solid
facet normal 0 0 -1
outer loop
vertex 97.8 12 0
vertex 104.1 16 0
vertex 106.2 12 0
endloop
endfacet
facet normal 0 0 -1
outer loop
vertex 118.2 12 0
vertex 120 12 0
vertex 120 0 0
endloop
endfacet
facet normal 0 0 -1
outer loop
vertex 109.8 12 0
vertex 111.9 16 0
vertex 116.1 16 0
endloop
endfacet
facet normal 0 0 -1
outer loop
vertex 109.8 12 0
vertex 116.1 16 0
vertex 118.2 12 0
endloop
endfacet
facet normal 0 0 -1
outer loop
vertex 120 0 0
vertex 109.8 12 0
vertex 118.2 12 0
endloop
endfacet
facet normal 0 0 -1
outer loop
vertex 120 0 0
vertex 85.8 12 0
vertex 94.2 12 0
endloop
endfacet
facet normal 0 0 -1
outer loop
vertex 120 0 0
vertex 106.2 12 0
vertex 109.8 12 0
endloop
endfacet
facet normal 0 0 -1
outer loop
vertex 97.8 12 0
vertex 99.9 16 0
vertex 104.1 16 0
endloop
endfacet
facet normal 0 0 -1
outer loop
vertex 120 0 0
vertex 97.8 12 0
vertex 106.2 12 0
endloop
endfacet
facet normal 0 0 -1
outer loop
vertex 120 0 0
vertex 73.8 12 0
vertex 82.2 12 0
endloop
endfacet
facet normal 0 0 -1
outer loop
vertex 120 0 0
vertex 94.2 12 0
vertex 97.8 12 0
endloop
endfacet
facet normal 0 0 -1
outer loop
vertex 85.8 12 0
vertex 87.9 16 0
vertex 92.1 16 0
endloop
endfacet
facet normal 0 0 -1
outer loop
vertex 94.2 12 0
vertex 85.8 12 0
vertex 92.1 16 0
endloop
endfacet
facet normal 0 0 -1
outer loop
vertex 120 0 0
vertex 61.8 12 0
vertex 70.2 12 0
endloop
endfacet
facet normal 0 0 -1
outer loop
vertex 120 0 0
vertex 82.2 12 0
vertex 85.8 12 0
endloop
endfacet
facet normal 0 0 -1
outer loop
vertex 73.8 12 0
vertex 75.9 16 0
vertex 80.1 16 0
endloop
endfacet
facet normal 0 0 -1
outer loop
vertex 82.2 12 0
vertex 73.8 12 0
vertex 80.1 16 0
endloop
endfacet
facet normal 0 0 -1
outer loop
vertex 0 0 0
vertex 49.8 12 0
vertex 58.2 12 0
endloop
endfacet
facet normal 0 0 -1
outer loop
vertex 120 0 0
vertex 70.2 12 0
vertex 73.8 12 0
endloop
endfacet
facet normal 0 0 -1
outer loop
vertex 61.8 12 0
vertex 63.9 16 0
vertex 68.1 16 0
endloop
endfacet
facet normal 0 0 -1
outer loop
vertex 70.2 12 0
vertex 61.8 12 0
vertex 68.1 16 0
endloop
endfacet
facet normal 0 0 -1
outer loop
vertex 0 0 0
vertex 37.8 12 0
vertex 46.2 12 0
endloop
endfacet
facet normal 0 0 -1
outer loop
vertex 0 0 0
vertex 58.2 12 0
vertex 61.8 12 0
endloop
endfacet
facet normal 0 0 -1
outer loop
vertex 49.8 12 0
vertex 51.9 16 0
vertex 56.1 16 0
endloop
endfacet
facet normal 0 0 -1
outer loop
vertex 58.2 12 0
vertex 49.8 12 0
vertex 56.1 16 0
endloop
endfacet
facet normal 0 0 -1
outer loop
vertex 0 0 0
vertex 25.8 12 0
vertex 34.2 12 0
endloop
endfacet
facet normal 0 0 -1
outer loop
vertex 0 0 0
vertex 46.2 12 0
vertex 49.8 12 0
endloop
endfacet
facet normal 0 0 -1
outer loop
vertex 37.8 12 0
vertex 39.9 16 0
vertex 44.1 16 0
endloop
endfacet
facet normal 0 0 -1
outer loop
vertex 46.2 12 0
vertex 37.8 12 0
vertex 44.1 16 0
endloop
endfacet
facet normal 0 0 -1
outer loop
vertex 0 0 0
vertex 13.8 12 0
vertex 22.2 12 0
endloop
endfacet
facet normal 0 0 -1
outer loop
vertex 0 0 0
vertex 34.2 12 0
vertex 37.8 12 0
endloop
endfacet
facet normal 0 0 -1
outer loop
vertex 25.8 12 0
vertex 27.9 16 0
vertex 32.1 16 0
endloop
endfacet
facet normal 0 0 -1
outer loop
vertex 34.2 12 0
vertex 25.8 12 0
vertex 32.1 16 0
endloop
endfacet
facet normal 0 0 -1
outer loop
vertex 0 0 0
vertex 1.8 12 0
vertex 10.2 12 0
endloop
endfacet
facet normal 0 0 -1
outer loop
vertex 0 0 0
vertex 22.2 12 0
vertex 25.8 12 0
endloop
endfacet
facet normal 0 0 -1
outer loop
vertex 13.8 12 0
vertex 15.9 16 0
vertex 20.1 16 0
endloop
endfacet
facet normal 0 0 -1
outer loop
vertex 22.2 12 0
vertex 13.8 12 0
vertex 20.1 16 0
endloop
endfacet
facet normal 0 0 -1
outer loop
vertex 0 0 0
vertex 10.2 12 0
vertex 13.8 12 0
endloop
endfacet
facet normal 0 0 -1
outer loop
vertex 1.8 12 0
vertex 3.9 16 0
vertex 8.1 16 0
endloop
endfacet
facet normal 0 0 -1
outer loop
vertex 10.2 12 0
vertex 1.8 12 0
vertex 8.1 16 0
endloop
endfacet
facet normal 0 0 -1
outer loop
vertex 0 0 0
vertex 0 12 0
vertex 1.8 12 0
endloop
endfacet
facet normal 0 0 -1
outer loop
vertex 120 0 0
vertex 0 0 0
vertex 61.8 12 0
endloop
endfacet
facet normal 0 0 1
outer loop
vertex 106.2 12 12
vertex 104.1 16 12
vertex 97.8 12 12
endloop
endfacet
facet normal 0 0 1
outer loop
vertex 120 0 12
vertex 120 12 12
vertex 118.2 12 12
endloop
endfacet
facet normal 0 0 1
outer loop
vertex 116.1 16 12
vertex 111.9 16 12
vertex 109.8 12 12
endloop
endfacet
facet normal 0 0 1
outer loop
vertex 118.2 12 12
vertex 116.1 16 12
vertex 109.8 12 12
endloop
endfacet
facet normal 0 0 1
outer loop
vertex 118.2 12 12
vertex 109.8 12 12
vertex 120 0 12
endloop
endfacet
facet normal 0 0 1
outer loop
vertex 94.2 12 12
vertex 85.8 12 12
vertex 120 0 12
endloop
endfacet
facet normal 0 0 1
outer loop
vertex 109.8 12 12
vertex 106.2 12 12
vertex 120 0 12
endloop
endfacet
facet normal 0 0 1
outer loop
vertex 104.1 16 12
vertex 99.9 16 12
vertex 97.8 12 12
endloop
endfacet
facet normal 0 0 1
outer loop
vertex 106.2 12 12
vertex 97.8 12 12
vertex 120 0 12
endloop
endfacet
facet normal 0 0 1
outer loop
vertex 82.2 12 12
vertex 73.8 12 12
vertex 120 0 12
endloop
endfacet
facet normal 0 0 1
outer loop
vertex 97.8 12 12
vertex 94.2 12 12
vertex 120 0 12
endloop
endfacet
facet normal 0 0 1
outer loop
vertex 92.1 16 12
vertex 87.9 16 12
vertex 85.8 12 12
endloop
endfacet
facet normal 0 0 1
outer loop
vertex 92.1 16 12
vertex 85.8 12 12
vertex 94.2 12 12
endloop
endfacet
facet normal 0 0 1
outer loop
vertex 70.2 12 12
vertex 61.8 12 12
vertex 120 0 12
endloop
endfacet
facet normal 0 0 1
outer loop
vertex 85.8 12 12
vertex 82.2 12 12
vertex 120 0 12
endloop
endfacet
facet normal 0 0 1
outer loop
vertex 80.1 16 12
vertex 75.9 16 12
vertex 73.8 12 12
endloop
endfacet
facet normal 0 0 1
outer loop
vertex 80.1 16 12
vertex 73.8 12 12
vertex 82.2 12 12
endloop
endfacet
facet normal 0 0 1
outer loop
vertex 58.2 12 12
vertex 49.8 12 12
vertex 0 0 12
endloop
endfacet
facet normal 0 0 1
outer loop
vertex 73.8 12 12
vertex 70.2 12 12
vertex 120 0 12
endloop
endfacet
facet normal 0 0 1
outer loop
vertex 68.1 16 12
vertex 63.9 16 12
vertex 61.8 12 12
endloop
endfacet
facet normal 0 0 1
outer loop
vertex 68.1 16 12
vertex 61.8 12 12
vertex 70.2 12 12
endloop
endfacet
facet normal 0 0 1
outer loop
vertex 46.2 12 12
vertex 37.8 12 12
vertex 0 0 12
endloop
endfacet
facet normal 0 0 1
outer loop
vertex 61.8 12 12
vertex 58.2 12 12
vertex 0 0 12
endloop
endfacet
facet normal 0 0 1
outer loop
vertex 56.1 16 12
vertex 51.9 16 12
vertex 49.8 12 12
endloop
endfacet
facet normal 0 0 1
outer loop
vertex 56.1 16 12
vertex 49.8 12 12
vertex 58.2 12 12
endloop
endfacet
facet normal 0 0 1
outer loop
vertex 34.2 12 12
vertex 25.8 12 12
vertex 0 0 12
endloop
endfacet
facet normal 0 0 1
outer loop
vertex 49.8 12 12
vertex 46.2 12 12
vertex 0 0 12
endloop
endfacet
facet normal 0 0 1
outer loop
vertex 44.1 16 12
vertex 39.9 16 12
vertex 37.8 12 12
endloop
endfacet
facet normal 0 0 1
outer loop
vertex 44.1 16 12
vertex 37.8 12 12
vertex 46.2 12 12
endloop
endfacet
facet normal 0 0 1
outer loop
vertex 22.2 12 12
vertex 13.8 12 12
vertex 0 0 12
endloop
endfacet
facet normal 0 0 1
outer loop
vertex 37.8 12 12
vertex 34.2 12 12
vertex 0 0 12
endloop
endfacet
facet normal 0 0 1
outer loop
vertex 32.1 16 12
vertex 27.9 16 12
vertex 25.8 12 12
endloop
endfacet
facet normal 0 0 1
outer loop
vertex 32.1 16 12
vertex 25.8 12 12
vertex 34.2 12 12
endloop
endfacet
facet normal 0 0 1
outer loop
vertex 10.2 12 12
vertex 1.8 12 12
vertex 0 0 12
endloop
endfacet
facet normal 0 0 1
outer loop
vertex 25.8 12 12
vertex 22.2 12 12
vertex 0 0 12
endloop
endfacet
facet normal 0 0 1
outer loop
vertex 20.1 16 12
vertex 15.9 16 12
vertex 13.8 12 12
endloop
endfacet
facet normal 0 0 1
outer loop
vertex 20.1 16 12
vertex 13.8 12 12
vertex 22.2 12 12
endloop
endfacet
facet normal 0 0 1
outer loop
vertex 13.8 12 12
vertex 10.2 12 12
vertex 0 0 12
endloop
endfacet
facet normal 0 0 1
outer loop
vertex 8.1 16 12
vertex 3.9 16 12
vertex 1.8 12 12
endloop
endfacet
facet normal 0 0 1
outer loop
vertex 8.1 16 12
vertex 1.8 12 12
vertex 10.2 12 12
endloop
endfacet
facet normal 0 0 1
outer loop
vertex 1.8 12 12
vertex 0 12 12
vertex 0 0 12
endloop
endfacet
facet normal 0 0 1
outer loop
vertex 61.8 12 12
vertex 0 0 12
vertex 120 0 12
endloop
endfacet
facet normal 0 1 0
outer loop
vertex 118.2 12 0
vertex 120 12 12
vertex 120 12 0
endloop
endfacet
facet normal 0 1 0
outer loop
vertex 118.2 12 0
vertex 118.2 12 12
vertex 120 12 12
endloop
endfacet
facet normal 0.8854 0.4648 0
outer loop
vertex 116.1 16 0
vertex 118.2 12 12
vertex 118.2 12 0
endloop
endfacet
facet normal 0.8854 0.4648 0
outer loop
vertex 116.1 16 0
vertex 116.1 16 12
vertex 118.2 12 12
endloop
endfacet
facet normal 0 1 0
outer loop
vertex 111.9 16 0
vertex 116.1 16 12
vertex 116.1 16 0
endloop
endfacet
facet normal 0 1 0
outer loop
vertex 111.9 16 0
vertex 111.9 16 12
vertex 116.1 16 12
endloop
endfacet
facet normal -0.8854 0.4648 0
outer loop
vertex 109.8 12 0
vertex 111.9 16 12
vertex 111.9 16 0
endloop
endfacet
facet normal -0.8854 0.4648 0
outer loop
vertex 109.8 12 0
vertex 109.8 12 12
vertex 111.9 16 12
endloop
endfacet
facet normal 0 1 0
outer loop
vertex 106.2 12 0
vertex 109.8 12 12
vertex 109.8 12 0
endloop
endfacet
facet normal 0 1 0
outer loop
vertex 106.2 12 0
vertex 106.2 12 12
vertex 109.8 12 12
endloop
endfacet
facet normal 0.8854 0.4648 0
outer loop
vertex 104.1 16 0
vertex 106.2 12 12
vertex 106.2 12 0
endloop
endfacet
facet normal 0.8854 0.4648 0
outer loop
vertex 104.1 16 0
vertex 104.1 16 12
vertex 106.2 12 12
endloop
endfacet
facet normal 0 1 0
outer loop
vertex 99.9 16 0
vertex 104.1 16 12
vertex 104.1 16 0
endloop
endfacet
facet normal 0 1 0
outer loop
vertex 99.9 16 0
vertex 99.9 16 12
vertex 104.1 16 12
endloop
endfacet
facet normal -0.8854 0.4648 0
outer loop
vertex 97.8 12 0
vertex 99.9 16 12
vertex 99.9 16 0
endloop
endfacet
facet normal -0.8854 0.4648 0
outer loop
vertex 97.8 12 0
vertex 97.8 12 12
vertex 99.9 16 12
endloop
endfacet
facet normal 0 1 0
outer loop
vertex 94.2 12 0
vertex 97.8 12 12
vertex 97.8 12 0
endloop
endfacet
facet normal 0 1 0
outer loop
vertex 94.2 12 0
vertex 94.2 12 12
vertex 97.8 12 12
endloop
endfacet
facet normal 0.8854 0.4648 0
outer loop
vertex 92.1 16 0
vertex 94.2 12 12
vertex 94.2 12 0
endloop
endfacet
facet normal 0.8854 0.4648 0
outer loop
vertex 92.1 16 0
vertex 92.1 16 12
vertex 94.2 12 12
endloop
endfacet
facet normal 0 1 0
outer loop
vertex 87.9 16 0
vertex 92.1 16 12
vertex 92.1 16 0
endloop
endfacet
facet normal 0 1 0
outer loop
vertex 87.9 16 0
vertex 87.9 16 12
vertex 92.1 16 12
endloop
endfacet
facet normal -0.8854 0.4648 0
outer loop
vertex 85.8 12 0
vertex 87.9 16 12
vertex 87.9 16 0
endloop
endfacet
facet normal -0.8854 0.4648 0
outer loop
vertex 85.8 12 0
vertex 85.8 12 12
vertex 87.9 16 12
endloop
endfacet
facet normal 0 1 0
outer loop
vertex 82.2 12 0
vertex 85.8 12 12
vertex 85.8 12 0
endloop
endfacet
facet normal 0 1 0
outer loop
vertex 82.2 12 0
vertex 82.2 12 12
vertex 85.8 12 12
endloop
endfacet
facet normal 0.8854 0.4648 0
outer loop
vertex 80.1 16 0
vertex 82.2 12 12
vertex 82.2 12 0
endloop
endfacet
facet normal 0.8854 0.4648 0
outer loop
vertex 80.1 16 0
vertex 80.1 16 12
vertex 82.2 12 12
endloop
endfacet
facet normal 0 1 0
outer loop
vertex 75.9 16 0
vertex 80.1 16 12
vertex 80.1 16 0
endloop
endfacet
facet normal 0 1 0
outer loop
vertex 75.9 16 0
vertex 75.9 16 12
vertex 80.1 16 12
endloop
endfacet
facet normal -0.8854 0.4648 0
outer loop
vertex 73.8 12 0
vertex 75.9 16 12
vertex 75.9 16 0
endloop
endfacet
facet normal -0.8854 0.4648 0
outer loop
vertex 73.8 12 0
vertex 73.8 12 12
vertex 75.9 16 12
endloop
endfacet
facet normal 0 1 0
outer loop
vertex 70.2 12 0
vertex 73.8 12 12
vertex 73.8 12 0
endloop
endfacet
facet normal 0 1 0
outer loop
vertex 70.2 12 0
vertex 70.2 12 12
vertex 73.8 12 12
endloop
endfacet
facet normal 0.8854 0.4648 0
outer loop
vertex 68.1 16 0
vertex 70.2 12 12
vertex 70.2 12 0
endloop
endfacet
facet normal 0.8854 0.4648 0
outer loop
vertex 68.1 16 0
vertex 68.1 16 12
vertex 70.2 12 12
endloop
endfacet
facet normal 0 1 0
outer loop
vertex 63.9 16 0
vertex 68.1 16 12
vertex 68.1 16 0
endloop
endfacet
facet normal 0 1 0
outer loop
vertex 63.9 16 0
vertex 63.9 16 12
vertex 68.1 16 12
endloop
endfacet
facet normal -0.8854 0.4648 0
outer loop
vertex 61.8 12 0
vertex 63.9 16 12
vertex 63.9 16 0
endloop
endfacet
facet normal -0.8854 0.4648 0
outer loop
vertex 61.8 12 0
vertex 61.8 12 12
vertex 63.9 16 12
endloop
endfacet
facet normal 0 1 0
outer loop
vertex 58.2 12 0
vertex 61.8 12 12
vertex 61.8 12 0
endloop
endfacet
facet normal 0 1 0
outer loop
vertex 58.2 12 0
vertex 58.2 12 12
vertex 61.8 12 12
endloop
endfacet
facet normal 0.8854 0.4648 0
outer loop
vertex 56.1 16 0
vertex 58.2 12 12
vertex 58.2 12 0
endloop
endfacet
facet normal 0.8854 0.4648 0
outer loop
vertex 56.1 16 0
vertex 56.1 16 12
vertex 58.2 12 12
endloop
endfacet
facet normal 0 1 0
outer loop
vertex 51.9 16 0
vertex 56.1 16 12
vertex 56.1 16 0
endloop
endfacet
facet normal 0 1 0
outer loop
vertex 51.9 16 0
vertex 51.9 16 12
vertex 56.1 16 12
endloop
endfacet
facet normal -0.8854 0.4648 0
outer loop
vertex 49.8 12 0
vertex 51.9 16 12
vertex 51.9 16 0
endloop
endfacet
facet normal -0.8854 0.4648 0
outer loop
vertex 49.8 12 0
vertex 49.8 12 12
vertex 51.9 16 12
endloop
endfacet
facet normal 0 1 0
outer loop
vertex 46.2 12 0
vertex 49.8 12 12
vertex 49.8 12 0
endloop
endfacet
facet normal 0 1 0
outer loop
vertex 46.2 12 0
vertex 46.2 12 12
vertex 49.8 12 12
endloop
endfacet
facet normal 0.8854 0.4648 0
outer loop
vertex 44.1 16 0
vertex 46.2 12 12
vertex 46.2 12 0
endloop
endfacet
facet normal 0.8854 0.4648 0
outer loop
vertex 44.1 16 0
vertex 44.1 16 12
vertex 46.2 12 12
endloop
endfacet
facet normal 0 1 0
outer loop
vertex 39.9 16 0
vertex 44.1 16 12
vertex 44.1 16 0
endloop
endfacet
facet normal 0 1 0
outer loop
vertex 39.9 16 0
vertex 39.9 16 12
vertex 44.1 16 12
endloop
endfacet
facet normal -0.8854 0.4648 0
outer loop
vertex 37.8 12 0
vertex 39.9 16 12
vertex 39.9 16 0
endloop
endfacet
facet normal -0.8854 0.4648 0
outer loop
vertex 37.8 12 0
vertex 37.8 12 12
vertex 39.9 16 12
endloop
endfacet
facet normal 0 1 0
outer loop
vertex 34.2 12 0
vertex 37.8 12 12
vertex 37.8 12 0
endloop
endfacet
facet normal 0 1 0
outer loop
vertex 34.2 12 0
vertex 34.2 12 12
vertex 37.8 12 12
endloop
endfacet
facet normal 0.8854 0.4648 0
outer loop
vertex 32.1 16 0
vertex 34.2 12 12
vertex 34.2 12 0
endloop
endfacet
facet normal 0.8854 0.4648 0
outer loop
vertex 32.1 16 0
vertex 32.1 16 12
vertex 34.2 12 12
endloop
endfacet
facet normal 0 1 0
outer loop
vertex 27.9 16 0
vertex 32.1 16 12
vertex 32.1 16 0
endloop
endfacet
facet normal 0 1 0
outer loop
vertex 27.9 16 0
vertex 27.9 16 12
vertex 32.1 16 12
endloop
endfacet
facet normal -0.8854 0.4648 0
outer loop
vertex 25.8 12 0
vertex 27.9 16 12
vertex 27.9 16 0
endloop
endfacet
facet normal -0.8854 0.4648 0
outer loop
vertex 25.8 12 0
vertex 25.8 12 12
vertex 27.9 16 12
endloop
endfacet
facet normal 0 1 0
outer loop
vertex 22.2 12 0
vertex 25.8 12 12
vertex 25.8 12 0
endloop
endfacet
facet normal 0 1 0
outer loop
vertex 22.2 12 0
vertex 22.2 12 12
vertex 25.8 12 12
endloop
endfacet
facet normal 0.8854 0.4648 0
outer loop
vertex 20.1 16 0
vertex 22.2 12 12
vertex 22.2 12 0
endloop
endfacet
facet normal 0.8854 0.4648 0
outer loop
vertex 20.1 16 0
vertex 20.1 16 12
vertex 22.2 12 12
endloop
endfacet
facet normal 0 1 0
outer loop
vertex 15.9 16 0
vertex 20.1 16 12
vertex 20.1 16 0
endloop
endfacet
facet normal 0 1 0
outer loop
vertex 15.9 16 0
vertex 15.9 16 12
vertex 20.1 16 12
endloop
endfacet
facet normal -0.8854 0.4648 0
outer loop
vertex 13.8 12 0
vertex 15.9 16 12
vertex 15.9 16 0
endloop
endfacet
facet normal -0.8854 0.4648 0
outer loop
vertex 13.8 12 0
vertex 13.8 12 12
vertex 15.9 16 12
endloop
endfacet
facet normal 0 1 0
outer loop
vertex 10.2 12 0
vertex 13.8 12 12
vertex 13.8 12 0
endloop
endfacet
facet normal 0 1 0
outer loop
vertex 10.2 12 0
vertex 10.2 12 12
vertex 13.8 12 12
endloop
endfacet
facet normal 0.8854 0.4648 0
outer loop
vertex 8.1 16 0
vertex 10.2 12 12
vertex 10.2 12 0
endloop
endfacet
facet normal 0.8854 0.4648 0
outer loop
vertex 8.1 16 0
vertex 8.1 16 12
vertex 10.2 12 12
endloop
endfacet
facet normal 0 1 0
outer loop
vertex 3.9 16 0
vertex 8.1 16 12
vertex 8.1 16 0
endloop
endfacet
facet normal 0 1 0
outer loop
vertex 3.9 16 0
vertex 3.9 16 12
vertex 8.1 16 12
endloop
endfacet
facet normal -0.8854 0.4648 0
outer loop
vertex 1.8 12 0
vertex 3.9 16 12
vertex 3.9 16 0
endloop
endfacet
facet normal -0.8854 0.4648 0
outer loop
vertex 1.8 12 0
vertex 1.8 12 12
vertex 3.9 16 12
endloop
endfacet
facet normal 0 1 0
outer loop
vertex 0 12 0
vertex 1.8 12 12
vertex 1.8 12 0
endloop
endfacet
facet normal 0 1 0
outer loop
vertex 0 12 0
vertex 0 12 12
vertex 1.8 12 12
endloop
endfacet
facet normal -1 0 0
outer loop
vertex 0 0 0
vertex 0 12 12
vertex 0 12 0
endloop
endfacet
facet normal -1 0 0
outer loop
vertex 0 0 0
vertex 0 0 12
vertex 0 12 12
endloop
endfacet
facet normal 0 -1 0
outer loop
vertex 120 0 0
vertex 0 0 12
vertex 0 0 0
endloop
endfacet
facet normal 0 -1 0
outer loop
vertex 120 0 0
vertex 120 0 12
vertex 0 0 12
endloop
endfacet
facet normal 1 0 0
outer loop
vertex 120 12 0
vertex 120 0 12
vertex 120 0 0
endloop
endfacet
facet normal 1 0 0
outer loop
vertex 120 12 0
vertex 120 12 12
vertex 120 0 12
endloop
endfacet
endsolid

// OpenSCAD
$fn = 32;

// ----------------------------------------------------------------------
// Gear rack: 10 teeth, pitch 12 mm
// ----------------------------------------------------------------------

// --- parameters (mm) ---
teeth = 10;               // number of teeth
pitch = 12;               // tooth pitch, X
root_w = 8.4;             // tooth width at the root
tip_w = 4.2;              // tooth width at the tip
base_h = 12;              // rack body height, Y
tooth_h = 4;              // tooth height above the body
plate_t = 12;             // rack width, Z (extrusion height)

rack_l = teeth * pitch;  // overall length
total_h = base_h + tooth_h;  // overall height

profile = [[0, 0], [120, 0], [120, 12], [118.2, 12], [116.1, 16], [111.9, 16], [109.8, 12], [106.2, 12], [104.1, 16], [99.9, 16], [97.8, 12], [94.2, 12], [92.1, 16], [87.9, 16], [85.8, 12], [82.2, 12], [80.1, 16], [75.9, 16], [73.8, 12], [70.2, 12], [68.1, 16], [63.9, 16], [61.8, 12], [58.2, 12], [56.1, 16], [51.9, 16], [49.8, 12], [46.2, 12], [44.1, 16], [39.9, 16], [37.8, 12], [34.2, 12], [32.1, 16], [27.9, 16], [25.8, 12], [22.2, 12], [20.1, 16], [15.9, 16], [13.8, 12], [10.2, 12], [8.1, 16], [3.9, 16], [1.8, 12], [0, 12]];  // primary outline, 44 points, counter clockwise

// --- the one profile operation ---
linear_extrude(height = plate_t) polygon(points = profile);
